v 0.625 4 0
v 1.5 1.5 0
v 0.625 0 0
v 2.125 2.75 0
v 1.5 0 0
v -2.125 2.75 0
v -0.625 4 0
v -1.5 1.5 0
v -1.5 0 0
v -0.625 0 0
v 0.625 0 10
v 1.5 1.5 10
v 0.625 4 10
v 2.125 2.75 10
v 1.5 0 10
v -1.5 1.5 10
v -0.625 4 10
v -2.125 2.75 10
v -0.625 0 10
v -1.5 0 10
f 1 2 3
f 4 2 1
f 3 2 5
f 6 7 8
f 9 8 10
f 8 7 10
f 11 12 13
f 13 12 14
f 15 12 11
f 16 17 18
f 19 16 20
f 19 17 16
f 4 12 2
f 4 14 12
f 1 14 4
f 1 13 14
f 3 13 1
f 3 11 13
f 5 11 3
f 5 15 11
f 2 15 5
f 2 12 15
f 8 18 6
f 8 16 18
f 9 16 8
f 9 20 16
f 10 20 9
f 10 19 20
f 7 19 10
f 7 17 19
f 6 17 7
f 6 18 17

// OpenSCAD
//zipClip();
//hammerNut();
openBeamClip();


//import("OpenBeam_1515_Extrusion_Clear_Anodized.STL");

//import("OpenBeam_1515_Extrusion_Clear_Anodized.STL");

module openBeamClip(height = 10) {
    insertWidth = 3;
    internalWidth = 5-0.75;
    internalDepth = 2.5;
    lipDepth = 1.5;
    clipWidth = (internalWidth-insertWidth);

    linear_extrude(height=height)
    polygon([[insertWidth/2, 0], [insertWidth/2, lipDepth], [internalWidth/2, lipDepth+internalDepth/2], [clipWidth/2, lipDepth+internalDepth],
             [clipWidth/2, 0], [-clipWidth/2, 0],
             [-clipWidth/2, lipDepth+internalDepth], [-internalWidth/2, lipDepth+internalDepth/2], [-insertWidth/2, lipDepth], [-insertWidth/2, 0]]);
}

module hammerNut() {
    tolerance = 0.15;

    channelWidth = 5.75 - tolerance;
    channelDepth = 2.5;

    difference() {
        

        
        halfRoundedCube(width=channelWidth, height=channelDepth);

        

        m3radi = 3.25; //2.86;
        translate([0,0,-tolerance]) cylinder(d=m3radi, h=channelDepth+2*tolerance, $fn=16);
    }
}

module halfRoundedCube(width = 5, height=1) 
{
    radius = width/2;

    cylinder(r=radius, h=height, $fn=16);
    cube([radius, radius, height]);
    translate([-radius, -radius, 0]) cube([radius, radius, height]);
}

module zipClip() {

    width = 3;
    height = 5;

    // cable-tie
    cable_tie = false;
    vertical = true;

    // open-beam attachement
    difference() {

        cube([15+width, 15+width, height], center=true);

        // nut cutouts
        cube([15, 6, 20], center=true);
        cube([ 6, 15, 20], center=true);

        // side rear indents
        translate([-7.5+1.5/2,-4,0]) cube([1.5, 6, 20], center=true);
        translate([7.5-1.5/2,-4,0]) cube([1.5, 6, 20], center=true);

        // side front indents
        translate([0,4.2,0]) cube([15, 1, 20], center=true);

        // front side indents
        translate([-4.5, +7.5-1.3/2+0.24,0]) cube([6, 1, 20], center=true);
        translate([4.5, 7.5-1.3/2+0.24,0]) cube([6, 1, 20], center=true);
        translate([0,6.5,0]) cube([12, 1, 20], center=true);

        // front clip
        translate([0,15-2.5,0]) rotate([0,0,45]) cube([15, 15, 20], center=true);

        translate([-15/2, -15/2, -100]) import("OpenBeam_1515_Extrusion_Clear_Anodized.STL");

    }



    beta =  vertical ? 90 : 0;
    x = vertical ? height : 15 + width;
    y = vertical ? 15 + width : height;
    z = vertical ? 3 : 4.4;
    i = vertical ? 6 : 3;
    j = vertical ? 2 : 3;

    if (cable_tie) {
        for (alpha=[0:90:180]) {
            rotate([beta,0,-alpha]) {
                translate([15/2, 0, 0]) {
                    difference() {
                        hull() 
                        {
                            translate([width/2,0,0]) cube([0.00001, x, y], center=true);
                            translate([4, z,0]) cylinder(r=1.5, h=i, center=true, $fn=16);
                            translate([4,-z,0]) cylinder(r=1.5, h=i, center=true, $fn=16);
                        }

                        hull() 
                        {
                            translate([3,-j,0]) cylinder(r=1, h=20, center=true, $fn=16);
                            translate([3, j,0]) cylinder(r=1, h=20, center=true, $fn=16);
                        }
                    }
                }
            }

        }

    }

}
